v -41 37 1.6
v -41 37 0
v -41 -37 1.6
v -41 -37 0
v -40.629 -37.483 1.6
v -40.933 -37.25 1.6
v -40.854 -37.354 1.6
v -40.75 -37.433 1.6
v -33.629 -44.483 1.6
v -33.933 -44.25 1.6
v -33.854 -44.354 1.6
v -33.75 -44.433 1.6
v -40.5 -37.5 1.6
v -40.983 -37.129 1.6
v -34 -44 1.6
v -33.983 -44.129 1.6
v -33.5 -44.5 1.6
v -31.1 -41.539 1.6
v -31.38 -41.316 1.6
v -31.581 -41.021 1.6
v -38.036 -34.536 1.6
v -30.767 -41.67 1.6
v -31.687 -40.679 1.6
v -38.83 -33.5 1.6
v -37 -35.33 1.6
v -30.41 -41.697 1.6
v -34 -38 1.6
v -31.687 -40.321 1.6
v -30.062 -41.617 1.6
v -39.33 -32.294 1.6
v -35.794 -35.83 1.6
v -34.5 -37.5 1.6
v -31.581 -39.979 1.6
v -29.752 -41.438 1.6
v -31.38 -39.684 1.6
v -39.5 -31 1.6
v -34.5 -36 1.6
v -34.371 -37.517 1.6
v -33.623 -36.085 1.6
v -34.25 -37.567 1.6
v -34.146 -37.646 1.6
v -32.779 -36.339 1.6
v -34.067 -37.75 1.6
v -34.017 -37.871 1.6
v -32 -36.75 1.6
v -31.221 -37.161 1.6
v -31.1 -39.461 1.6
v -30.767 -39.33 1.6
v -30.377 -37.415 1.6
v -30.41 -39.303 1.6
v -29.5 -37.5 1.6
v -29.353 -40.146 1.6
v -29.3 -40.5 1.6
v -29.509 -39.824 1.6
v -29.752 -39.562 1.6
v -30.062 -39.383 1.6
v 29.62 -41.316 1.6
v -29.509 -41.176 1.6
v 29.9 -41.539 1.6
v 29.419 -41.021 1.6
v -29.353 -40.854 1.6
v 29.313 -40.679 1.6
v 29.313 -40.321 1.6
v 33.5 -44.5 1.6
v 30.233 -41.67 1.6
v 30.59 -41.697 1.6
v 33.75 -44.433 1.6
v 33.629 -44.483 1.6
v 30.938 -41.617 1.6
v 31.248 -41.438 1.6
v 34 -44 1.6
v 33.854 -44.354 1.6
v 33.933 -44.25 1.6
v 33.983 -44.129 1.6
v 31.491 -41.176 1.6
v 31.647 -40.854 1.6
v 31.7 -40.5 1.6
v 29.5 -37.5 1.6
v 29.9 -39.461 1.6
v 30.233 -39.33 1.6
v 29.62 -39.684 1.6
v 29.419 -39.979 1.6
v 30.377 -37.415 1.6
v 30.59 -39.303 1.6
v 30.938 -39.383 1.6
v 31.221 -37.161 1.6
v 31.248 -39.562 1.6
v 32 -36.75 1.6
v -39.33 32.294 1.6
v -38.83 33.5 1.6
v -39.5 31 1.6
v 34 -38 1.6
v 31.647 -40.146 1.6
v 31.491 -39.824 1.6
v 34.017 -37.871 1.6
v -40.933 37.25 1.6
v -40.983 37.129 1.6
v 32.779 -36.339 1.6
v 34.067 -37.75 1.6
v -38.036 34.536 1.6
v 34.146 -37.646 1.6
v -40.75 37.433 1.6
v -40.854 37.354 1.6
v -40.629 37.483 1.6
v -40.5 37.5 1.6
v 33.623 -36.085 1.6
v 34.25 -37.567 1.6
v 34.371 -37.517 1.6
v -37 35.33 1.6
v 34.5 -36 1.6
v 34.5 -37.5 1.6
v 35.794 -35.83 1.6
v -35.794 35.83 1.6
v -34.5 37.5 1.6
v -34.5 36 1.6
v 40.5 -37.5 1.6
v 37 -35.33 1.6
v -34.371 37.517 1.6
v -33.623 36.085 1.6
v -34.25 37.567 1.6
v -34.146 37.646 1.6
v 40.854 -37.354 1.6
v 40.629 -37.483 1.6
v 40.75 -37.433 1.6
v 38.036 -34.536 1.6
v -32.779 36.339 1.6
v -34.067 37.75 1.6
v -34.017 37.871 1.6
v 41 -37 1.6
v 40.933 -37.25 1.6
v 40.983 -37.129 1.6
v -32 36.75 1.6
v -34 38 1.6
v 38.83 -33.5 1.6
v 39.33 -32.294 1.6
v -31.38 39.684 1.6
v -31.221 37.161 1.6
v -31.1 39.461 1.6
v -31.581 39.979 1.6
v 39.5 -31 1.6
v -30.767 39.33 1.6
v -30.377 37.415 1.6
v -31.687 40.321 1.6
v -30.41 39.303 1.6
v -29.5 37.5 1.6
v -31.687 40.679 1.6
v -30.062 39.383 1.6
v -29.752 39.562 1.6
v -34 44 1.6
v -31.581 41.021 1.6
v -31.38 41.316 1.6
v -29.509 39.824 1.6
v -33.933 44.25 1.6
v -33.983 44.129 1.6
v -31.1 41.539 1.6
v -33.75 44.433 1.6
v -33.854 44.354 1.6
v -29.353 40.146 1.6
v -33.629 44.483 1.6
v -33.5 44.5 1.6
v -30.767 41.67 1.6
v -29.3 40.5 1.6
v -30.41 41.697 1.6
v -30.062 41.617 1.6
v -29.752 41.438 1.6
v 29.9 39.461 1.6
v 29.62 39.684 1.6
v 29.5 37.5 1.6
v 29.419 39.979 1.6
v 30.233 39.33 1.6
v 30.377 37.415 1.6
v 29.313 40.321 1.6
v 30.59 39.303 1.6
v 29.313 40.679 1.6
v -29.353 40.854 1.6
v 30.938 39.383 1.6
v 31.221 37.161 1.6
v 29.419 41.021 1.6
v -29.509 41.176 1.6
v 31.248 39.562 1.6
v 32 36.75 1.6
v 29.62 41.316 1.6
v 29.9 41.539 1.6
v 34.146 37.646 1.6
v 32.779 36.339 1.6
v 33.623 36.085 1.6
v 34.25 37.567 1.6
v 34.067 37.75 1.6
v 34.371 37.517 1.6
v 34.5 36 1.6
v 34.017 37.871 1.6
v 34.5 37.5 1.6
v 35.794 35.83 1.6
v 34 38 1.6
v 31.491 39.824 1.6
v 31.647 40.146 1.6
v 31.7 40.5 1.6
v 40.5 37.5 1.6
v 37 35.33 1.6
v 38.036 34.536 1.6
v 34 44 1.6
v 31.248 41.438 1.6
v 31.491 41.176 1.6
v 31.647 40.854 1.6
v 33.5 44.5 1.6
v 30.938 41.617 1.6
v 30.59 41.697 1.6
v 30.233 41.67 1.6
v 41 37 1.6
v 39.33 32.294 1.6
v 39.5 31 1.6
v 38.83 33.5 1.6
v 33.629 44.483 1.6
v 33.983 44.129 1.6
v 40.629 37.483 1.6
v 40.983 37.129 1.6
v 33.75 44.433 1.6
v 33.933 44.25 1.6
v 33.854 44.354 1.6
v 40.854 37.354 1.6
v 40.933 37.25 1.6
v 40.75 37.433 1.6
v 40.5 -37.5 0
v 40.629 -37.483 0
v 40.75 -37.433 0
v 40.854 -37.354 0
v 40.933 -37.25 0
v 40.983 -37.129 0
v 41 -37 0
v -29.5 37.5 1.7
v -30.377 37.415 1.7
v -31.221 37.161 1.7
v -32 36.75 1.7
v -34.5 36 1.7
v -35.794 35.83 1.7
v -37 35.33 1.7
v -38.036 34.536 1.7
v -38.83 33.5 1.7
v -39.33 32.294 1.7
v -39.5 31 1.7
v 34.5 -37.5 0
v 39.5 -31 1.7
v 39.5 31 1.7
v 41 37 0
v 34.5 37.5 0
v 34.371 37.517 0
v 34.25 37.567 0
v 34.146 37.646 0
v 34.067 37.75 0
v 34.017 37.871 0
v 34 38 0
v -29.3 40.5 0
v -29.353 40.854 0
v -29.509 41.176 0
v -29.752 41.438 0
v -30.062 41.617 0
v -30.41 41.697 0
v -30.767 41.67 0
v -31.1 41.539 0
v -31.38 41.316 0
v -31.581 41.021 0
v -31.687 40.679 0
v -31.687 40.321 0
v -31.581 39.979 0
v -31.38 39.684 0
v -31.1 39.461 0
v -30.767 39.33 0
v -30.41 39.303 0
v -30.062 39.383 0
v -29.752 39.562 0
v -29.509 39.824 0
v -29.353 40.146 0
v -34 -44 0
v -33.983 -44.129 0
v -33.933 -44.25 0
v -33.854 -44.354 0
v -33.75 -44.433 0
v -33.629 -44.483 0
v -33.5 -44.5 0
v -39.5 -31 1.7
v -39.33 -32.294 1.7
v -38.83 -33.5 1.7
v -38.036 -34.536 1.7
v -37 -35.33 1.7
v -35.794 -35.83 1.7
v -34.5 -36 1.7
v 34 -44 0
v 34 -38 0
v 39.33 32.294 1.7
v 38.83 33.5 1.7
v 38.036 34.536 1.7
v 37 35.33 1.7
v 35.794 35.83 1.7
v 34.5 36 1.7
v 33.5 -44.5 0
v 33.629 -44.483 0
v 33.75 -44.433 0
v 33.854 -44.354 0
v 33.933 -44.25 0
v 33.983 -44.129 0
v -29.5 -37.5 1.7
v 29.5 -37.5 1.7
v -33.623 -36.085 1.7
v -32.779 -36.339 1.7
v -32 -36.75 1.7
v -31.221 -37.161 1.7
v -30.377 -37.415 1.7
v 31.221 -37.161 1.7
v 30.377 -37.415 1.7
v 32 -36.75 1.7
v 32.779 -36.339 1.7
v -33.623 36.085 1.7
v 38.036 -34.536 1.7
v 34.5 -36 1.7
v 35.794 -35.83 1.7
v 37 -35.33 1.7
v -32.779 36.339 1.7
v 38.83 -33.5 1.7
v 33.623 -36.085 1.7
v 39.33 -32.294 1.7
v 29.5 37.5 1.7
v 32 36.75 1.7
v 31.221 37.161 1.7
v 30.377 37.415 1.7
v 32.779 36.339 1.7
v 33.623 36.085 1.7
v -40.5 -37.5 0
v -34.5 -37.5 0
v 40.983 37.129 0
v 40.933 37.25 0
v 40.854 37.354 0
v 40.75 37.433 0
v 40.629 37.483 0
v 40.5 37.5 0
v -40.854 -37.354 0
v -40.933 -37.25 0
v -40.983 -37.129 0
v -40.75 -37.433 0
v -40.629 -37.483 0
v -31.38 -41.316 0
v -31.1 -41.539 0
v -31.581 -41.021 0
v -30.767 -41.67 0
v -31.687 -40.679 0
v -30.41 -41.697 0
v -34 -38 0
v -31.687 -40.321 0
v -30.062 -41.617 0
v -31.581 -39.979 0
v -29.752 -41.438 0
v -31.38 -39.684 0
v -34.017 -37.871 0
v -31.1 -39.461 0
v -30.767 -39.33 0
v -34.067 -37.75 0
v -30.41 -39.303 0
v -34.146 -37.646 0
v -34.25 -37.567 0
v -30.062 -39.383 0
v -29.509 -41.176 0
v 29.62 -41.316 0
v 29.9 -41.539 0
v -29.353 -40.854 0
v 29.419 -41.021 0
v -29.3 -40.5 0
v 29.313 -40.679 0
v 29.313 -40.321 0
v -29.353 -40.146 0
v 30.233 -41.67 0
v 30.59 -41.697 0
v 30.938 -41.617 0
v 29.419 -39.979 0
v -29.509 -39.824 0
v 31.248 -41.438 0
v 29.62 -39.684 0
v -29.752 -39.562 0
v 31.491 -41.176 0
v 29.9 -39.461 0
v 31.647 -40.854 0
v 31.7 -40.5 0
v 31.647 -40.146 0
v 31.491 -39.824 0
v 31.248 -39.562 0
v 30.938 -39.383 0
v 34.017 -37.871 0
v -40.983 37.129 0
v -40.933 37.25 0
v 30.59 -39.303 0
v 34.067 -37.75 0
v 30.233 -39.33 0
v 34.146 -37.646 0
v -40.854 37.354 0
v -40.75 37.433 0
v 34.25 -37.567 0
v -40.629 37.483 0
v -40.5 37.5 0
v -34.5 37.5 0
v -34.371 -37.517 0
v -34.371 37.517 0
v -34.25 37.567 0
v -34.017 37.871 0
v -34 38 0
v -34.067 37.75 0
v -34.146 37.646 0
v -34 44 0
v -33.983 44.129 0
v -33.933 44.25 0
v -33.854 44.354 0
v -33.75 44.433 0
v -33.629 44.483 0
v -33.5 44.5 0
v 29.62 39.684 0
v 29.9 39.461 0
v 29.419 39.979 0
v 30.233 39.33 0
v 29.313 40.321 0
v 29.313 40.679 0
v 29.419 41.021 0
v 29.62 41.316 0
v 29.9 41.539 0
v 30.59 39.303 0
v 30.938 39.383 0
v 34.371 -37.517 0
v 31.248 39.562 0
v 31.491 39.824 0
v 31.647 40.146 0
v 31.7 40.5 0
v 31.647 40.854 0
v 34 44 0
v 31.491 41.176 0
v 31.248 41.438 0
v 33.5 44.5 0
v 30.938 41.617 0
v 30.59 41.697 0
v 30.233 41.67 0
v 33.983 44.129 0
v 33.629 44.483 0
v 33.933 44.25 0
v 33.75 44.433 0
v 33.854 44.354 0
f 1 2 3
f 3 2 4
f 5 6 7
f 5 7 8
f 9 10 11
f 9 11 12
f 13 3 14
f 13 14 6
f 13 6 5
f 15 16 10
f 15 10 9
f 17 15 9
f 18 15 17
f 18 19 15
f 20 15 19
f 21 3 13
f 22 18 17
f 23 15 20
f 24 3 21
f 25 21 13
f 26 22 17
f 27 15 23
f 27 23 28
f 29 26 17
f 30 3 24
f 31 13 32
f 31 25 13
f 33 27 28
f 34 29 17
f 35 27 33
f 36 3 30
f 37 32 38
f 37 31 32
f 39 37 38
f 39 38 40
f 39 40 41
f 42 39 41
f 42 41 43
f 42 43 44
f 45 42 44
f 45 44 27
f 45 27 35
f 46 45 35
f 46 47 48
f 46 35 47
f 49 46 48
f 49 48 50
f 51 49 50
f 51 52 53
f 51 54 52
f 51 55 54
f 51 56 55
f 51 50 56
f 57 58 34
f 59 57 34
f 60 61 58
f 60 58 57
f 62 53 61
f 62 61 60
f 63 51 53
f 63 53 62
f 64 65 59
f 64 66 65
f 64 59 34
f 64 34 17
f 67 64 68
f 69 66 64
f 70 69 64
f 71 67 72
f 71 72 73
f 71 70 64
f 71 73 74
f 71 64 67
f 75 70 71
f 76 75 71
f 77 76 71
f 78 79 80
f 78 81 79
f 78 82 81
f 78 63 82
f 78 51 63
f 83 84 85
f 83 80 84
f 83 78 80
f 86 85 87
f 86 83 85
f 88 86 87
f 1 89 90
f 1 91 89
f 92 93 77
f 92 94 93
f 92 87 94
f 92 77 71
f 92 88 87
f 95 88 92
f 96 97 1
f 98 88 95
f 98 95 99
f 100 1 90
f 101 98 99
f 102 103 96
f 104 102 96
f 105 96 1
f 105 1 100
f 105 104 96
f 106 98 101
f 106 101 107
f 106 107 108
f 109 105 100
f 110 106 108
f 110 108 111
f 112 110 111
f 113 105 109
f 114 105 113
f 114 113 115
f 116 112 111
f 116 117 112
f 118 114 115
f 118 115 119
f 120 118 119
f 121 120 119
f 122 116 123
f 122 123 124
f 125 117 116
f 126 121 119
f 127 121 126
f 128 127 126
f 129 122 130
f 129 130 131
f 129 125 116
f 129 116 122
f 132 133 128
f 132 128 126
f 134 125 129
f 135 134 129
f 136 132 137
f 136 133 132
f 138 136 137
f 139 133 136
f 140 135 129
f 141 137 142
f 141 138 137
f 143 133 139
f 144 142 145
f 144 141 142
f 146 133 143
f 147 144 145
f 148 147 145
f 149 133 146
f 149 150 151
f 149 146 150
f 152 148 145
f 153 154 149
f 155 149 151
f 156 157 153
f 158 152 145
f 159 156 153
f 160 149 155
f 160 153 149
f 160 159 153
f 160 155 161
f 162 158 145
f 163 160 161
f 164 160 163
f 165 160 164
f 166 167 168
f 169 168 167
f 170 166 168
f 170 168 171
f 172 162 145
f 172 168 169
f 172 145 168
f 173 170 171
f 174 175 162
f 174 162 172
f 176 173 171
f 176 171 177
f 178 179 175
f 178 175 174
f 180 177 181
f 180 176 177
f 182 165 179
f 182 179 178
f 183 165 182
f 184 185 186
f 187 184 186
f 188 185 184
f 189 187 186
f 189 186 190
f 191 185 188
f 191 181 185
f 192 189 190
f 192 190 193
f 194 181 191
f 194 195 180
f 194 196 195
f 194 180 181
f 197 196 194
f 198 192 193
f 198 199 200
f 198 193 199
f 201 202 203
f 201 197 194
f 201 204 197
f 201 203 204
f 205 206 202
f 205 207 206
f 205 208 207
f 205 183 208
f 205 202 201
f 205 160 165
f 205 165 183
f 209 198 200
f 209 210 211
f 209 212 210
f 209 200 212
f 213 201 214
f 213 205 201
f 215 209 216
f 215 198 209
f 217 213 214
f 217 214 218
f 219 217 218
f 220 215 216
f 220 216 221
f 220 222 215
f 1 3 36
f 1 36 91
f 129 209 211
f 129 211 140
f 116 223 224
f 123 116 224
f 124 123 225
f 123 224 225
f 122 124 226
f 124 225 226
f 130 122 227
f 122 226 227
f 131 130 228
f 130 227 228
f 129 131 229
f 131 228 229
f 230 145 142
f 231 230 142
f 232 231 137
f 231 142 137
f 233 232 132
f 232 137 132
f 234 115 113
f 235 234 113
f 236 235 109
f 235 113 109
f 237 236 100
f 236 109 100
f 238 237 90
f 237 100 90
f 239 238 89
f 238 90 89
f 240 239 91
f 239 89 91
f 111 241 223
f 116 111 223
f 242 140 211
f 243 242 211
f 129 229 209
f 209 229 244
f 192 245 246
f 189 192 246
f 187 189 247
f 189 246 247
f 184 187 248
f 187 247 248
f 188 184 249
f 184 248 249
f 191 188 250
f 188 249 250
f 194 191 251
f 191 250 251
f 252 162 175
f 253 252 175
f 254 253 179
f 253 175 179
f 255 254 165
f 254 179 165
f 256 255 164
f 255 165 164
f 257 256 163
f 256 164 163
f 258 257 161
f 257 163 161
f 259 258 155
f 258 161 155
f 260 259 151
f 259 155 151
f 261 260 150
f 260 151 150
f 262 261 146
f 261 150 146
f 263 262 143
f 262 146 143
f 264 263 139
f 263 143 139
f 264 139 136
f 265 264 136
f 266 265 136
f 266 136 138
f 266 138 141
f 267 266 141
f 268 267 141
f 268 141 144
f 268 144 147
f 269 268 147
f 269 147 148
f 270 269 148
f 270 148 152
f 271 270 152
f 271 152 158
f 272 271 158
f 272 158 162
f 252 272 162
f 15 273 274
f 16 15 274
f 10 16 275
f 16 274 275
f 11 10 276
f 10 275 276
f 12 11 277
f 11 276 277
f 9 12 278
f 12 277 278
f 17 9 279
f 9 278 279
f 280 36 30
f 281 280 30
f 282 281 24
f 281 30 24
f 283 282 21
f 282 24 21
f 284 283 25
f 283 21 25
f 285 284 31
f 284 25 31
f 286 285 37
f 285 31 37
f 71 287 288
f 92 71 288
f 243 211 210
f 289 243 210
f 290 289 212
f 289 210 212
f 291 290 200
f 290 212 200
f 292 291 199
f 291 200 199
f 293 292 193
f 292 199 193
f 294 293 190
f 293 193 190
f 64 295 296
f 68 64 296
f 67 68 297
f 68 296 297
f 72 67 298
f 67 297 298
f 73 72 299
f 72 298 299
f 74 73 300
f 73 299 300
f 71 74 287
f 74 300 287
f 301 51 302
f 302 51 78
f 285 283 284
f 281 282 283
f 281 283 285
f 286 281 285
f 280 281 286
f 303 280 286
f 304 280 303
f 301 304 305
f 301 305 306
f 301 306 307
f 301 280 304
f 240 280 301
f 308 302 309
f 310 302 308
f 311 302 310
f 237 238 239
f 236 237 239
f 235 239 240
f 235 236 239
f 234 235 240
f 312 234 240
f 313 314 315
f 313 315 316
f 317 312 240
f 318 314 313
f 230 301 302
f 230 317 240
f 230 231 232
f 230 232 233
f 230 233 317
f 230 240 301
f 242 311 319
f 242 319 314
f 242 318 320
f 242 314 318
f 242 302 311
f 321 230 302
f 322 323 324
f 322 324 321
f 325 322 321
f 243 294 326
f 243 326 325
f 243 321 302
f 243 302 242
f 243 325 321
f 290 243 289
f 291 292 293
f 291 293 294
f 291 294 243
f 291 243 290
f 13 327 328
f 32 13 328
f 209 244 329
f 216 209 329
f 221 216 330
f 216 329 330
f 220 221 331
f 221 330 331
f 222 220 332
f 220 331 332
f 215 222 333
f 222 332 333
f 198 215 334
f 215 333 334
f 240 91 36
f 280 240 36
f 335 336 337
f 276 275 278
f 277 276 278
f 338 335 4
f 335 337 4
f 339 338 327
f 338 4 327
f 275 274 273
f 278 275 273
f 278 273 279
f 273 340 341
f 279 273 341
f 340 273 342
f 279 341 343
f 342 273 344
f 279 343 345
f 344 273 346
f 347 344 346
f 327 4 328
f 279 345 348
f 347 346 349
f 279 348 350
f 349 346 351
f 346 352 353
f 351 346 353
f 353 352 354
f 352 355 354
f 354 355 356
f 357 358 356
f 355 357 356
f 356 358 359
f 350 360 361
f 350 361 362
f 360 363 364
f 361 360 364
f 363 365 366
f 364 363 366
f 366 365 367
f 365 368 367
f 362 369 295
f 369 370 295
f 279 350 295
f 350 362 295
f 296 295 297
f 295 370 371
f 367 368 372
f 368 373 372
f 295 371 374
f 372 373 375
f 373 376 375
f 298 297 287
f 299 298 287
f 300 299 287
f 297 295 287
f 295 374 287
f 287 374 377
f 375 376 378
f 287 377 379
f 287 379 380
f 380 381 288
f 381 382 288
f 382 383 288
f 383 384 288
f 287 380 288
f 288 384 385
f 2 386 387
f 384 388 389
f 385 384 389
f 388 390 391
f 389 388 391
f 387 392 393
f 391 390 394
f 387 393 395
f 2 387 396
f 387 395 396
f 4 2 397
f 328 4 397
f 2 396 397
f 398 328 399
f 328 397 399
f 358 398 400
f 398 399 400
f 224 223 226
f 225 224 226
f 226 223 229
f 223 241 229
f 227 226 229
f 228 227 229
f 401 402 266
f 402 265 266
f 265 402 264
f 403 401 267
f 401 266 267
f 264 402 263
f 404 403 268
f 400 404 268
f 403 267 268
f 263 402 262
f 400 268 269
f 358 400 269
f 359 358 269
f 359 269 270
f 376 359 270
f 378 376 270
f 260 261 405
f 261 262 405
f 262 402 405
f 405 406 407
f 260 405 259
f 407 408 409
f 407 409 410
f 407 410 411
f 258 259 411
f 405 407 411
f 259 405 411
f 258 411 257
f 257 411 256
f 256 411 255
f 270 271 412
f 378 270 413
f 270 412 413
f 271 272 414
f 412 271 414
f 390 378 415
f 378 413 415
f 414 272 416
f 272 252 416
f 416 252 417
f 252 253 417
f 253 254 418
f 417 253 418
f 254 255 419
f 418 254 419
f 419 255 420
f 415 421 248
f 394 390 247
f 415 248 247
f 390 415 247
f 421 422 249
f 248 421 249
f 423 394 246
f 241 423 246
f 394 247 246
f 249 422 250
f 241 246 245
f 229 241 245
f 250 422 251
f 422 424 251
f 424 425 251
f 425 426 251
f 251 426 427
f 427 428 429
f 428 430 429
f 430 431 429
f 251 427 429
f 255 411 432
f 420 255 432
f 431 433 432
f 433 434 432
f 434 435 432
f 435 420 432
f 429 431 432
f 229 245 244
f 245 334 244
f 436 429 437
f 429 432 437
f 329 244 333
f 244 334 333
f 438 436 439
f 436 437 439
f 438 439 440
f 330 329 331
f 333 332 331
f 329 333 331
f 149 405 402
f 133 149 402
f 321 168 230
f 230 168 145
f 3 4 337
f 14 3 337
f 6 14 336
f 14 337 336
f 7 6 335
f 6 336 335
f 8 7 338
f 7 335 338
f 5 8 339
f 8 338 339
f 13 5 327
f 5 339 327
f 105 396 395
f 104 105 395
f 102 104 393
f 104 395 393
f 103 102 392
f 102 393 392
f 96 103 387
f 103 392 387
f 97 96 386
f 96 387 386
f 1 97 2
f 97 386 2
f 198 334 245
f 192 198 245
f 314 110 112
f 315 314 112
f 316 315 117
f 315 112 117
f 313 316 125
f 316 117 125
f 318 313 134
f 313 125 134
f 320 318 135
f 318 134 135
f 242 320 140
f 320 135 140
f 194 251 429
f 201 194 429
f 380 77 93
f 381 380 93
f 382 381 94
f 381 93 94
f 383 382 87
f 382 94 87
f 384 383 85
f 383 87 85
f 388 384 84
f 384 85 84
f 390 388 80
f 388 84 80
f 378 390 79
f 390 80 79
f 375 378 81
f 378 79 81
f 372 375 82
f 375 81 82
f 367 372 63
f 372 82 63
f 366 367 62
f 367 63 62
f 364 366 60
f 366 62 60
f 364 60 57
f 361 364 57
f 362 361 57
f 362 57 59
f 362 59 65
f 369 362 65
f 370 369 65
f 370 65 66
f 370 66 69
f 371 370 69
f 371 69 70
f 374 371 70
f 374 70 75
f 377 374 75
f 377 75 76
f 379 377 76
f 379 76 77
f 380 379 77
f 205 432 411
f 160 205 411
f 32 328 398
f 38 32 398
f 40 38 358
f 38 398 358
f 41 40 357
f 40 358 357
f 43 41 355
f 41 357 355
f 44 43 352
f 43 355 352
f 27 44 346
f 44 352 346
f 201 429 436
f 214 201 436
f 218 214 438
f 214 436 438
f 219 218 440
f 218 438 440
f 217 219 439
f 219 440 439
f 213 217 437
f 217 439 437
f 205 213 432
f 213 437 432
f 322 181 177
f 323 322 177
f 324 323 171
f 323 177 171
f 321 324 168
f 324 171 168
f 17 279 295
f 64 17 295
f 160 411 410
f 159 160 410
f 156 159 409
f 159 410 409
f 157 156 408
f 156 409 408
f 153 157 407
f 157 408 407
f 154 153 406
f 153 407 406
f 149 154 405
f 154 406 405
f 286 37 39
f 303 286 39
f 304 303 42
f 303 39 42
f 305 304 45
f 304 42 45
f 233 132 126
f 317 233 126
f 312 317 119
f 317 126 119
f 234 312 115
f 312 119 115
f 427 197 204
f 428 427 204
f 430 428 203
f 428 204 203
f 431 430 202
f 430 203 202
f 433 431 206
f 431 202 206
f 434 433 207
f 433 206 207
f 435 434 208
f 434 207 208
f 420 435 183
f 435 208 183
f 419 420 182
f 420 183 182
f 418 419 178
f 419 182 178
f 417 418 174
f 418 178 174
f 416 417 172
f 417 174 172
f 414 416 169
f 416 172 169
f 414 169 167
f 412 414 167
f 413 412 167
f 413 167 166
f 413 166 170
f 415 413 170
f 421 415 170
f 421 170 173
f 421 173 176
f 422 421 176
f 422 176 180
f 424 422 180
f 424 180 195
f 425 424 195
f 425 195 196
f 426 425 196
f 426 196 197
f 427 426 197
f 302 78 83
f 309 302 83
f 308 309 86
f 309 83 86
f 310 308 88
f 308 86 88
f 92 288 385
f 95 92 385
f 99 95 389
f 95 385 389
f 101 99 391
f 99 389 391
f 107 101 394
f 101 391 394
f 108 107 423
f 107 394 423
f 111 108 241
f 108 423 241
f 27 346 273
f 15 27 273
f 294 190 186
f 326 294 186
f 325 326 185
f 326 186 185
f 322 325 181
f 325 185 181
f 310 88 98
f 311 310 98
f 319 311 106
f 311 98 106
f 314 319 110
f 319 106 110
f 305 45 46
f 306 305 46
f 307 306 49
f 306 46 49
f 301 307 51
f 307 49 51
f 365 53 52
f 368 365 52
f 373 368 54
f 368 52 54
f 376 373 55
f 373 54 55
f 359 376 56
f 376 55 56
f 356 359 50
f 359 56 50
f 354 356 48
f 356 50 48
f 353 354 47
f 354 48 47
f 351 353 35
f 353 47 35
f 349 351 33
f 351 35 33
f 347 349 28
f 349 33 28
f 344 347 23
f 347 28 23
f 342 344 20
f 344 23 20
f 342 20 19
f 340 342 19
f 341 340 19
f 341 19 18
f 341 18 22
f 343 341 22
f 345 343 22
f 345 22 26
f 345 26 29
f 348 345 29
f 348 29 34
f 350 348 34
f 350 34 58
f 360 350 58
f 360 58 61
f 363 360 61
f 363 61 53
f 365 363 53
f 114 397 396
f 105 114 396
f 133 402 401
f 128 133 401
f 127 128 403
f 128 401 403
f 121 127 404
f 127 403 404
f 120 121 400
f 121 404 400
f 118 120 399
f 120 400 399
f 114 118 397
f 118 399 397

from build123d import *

# Parameters (mm, degrees)
BOSS_EXTRUDE1_DEPTH            = 1.6
BOSS_EXTRUDE2_DEPTH            = 0.1
M2_HOLE1_FIXINGSTRUCTURE_D     = 2.4
M2_HOLE1_FIXINGSTRUCTURE_DEPTH = 200
M2_HOLE1_FIXINGSTRUCTURE_TIP   = 0.721032743


with BuildPart() as part:
    # Sketch1 → Boss-Extrude1 (new body)
    with BuildSketch(Plane.XY):
        with BuildLine():
            Line((-34, 44), (-34, 38))
            ThreePointArc((-34, 38), (-34.146446609, 37.646446609), (-34.5, 37.5))
            Line((-34.5, 37.5), (-40.5, 37.5))
            ThreePointArc((-40.5, 37.5), (-40.853553391, 37.353553391), (-41, 37))
            Line((-41, 37), (-41, -37))
            ThreePointArc((-41, -37), (-40.853553391, -37.353553391), (-40.5, -37.5))
            Line((-40.5, -37.5), (-34.5, -37.5))
            ThreePointArc((-34.5, -37.5), (-34.146446609, -37.646446609), (-34, -38))
            Line((-34, -38), (-34, -44))
            ThreePointArc((-34, -44), (-33.853553391, -44.353553391), (-33.5, -44.5))
            Line((-33.5, -44.5), (33.5, -44.5))
            ThreePointArc((33.5, -44.5), (33.853553391, -44.353553391), (34, -44))
            Line((34, -44), (34, -38))
            ThreePointArc((34, -38), (34.146446609, -37.646446609), (34.5, -37.5))
            Line((34.5, -37.5), (40.5, -37.5))
            ThreePointArc((40.5, -37.5), (40.853553391, -37.353553391), (41, -37))
            Line((41, -37), (41, 37))
            ThreePointArc((41, 37), (40.853553391, 37.353553391), (40.5, 37.5))
            Line((40.5, 37.5), (34.5, 37.5))
            ThreePointArc((34.5, 37.5), (34.146446609, 37.646446609), (34, 38))
            Line((34, 38), (34, 44))
            ThreePointArc((34, 44), (33.853553391, 44.353553391), (33.5, 44.5))
            Line((33.5, 44.5), (-33.5, 44.5))
            ThreePointArc((-33.5, 44.5), (-33.853553391, 44.353553391), (-34, 44))
        make_face()
    extrude(amount=BOSS_EXTRUDE1_DEPTH)

    # Esboço1 → Boss-Extrude2 (add)
    with BuildSketch(Plane.XY.offset(1.6)):
        with BuildLine():
            Line((-29.5, -37.5), (29.5, -37.5))
            ThreePointArc((29.5, -37.5), (30.805038314, -37.308461045), (32, -36.75))
            ThreePointArc((32, -36.75), (33.194961686, -36.191538955), (34.5, -36))
            ThreePointArc((34.5, -36), (38.035533906, -34.535533906), (39.5, -31))
            Line((39.5, -31), (39.5, 31))
            ThreePointArc((39.5, 31), (38.035533906, 34.535533906), (34.5, 36))
            ThreePointArc((34.5, 36), (33.194961686, 36.191538955), (32, 36.75))
            ThreePointArc((32, 36.75), (30.805038314, 37.308461045), (29.5, 37.5))
            Line((29.5, 37.5), (-29.5, 37.5))
            ThreePointArc((-29.5, 37.5), (-30.805038314, 37.308461045), (-32, 36.75))
            ThreePointArc((-32, 36.75), (-33.194961686, 36.191538955), (-34.5, 36))
            ThreePointArc((-34.5, 36), (-38.035533906, 34.535533906), (-39.5, 31))
            Line((-39.5, 31), (-39.5, -31))
            ThreePointArc((-39.5, -31), (-38.035533906, -34.535533906), (-34.5, -36))
            ThreePointArc((-34.5, -36), (-33.194961686, -36.191538955), (-32, -36.75))
            ThreePointArc((-32, -36.75), (-30.805038314, -37.308461045), (-29.5, -37.5))
        make_face()
    extrude(amount=BOSS_EXTRUDE2_DEPTH)

    # M2 Hole1-FixingStructure
    with Locations(Plane(origin=(0, 0, 0), x_dir=(-1, 0, 0), z_dir=(0, 0, -1))):
        with Locations((-30.5, 40.5), (30.5, 40.5), (-30.5, -40.5), (30.5, -40.5)):
            Hole(M2_HOLE1_FIXINGSTRUCTURE_D / 2, depth=M2_HOLE1_FIXINGSTRUCTURE_DEPTH)
            with Locations((0, 0, -(M2_HOLE1_FIXINGSTRUCTURE_DEPTH + M2_HOLE1_FIXINGSTRUCTURE_TIP / 2))):  # 118° drill point
                Cone(0, M2_HOLE1_FIXINGSTRUCTURE_D / 2, M2_HOLE1_FIXINGSTRUCTURE_TIP, mode=Mode.SUBTRACT)


solid = part.part
